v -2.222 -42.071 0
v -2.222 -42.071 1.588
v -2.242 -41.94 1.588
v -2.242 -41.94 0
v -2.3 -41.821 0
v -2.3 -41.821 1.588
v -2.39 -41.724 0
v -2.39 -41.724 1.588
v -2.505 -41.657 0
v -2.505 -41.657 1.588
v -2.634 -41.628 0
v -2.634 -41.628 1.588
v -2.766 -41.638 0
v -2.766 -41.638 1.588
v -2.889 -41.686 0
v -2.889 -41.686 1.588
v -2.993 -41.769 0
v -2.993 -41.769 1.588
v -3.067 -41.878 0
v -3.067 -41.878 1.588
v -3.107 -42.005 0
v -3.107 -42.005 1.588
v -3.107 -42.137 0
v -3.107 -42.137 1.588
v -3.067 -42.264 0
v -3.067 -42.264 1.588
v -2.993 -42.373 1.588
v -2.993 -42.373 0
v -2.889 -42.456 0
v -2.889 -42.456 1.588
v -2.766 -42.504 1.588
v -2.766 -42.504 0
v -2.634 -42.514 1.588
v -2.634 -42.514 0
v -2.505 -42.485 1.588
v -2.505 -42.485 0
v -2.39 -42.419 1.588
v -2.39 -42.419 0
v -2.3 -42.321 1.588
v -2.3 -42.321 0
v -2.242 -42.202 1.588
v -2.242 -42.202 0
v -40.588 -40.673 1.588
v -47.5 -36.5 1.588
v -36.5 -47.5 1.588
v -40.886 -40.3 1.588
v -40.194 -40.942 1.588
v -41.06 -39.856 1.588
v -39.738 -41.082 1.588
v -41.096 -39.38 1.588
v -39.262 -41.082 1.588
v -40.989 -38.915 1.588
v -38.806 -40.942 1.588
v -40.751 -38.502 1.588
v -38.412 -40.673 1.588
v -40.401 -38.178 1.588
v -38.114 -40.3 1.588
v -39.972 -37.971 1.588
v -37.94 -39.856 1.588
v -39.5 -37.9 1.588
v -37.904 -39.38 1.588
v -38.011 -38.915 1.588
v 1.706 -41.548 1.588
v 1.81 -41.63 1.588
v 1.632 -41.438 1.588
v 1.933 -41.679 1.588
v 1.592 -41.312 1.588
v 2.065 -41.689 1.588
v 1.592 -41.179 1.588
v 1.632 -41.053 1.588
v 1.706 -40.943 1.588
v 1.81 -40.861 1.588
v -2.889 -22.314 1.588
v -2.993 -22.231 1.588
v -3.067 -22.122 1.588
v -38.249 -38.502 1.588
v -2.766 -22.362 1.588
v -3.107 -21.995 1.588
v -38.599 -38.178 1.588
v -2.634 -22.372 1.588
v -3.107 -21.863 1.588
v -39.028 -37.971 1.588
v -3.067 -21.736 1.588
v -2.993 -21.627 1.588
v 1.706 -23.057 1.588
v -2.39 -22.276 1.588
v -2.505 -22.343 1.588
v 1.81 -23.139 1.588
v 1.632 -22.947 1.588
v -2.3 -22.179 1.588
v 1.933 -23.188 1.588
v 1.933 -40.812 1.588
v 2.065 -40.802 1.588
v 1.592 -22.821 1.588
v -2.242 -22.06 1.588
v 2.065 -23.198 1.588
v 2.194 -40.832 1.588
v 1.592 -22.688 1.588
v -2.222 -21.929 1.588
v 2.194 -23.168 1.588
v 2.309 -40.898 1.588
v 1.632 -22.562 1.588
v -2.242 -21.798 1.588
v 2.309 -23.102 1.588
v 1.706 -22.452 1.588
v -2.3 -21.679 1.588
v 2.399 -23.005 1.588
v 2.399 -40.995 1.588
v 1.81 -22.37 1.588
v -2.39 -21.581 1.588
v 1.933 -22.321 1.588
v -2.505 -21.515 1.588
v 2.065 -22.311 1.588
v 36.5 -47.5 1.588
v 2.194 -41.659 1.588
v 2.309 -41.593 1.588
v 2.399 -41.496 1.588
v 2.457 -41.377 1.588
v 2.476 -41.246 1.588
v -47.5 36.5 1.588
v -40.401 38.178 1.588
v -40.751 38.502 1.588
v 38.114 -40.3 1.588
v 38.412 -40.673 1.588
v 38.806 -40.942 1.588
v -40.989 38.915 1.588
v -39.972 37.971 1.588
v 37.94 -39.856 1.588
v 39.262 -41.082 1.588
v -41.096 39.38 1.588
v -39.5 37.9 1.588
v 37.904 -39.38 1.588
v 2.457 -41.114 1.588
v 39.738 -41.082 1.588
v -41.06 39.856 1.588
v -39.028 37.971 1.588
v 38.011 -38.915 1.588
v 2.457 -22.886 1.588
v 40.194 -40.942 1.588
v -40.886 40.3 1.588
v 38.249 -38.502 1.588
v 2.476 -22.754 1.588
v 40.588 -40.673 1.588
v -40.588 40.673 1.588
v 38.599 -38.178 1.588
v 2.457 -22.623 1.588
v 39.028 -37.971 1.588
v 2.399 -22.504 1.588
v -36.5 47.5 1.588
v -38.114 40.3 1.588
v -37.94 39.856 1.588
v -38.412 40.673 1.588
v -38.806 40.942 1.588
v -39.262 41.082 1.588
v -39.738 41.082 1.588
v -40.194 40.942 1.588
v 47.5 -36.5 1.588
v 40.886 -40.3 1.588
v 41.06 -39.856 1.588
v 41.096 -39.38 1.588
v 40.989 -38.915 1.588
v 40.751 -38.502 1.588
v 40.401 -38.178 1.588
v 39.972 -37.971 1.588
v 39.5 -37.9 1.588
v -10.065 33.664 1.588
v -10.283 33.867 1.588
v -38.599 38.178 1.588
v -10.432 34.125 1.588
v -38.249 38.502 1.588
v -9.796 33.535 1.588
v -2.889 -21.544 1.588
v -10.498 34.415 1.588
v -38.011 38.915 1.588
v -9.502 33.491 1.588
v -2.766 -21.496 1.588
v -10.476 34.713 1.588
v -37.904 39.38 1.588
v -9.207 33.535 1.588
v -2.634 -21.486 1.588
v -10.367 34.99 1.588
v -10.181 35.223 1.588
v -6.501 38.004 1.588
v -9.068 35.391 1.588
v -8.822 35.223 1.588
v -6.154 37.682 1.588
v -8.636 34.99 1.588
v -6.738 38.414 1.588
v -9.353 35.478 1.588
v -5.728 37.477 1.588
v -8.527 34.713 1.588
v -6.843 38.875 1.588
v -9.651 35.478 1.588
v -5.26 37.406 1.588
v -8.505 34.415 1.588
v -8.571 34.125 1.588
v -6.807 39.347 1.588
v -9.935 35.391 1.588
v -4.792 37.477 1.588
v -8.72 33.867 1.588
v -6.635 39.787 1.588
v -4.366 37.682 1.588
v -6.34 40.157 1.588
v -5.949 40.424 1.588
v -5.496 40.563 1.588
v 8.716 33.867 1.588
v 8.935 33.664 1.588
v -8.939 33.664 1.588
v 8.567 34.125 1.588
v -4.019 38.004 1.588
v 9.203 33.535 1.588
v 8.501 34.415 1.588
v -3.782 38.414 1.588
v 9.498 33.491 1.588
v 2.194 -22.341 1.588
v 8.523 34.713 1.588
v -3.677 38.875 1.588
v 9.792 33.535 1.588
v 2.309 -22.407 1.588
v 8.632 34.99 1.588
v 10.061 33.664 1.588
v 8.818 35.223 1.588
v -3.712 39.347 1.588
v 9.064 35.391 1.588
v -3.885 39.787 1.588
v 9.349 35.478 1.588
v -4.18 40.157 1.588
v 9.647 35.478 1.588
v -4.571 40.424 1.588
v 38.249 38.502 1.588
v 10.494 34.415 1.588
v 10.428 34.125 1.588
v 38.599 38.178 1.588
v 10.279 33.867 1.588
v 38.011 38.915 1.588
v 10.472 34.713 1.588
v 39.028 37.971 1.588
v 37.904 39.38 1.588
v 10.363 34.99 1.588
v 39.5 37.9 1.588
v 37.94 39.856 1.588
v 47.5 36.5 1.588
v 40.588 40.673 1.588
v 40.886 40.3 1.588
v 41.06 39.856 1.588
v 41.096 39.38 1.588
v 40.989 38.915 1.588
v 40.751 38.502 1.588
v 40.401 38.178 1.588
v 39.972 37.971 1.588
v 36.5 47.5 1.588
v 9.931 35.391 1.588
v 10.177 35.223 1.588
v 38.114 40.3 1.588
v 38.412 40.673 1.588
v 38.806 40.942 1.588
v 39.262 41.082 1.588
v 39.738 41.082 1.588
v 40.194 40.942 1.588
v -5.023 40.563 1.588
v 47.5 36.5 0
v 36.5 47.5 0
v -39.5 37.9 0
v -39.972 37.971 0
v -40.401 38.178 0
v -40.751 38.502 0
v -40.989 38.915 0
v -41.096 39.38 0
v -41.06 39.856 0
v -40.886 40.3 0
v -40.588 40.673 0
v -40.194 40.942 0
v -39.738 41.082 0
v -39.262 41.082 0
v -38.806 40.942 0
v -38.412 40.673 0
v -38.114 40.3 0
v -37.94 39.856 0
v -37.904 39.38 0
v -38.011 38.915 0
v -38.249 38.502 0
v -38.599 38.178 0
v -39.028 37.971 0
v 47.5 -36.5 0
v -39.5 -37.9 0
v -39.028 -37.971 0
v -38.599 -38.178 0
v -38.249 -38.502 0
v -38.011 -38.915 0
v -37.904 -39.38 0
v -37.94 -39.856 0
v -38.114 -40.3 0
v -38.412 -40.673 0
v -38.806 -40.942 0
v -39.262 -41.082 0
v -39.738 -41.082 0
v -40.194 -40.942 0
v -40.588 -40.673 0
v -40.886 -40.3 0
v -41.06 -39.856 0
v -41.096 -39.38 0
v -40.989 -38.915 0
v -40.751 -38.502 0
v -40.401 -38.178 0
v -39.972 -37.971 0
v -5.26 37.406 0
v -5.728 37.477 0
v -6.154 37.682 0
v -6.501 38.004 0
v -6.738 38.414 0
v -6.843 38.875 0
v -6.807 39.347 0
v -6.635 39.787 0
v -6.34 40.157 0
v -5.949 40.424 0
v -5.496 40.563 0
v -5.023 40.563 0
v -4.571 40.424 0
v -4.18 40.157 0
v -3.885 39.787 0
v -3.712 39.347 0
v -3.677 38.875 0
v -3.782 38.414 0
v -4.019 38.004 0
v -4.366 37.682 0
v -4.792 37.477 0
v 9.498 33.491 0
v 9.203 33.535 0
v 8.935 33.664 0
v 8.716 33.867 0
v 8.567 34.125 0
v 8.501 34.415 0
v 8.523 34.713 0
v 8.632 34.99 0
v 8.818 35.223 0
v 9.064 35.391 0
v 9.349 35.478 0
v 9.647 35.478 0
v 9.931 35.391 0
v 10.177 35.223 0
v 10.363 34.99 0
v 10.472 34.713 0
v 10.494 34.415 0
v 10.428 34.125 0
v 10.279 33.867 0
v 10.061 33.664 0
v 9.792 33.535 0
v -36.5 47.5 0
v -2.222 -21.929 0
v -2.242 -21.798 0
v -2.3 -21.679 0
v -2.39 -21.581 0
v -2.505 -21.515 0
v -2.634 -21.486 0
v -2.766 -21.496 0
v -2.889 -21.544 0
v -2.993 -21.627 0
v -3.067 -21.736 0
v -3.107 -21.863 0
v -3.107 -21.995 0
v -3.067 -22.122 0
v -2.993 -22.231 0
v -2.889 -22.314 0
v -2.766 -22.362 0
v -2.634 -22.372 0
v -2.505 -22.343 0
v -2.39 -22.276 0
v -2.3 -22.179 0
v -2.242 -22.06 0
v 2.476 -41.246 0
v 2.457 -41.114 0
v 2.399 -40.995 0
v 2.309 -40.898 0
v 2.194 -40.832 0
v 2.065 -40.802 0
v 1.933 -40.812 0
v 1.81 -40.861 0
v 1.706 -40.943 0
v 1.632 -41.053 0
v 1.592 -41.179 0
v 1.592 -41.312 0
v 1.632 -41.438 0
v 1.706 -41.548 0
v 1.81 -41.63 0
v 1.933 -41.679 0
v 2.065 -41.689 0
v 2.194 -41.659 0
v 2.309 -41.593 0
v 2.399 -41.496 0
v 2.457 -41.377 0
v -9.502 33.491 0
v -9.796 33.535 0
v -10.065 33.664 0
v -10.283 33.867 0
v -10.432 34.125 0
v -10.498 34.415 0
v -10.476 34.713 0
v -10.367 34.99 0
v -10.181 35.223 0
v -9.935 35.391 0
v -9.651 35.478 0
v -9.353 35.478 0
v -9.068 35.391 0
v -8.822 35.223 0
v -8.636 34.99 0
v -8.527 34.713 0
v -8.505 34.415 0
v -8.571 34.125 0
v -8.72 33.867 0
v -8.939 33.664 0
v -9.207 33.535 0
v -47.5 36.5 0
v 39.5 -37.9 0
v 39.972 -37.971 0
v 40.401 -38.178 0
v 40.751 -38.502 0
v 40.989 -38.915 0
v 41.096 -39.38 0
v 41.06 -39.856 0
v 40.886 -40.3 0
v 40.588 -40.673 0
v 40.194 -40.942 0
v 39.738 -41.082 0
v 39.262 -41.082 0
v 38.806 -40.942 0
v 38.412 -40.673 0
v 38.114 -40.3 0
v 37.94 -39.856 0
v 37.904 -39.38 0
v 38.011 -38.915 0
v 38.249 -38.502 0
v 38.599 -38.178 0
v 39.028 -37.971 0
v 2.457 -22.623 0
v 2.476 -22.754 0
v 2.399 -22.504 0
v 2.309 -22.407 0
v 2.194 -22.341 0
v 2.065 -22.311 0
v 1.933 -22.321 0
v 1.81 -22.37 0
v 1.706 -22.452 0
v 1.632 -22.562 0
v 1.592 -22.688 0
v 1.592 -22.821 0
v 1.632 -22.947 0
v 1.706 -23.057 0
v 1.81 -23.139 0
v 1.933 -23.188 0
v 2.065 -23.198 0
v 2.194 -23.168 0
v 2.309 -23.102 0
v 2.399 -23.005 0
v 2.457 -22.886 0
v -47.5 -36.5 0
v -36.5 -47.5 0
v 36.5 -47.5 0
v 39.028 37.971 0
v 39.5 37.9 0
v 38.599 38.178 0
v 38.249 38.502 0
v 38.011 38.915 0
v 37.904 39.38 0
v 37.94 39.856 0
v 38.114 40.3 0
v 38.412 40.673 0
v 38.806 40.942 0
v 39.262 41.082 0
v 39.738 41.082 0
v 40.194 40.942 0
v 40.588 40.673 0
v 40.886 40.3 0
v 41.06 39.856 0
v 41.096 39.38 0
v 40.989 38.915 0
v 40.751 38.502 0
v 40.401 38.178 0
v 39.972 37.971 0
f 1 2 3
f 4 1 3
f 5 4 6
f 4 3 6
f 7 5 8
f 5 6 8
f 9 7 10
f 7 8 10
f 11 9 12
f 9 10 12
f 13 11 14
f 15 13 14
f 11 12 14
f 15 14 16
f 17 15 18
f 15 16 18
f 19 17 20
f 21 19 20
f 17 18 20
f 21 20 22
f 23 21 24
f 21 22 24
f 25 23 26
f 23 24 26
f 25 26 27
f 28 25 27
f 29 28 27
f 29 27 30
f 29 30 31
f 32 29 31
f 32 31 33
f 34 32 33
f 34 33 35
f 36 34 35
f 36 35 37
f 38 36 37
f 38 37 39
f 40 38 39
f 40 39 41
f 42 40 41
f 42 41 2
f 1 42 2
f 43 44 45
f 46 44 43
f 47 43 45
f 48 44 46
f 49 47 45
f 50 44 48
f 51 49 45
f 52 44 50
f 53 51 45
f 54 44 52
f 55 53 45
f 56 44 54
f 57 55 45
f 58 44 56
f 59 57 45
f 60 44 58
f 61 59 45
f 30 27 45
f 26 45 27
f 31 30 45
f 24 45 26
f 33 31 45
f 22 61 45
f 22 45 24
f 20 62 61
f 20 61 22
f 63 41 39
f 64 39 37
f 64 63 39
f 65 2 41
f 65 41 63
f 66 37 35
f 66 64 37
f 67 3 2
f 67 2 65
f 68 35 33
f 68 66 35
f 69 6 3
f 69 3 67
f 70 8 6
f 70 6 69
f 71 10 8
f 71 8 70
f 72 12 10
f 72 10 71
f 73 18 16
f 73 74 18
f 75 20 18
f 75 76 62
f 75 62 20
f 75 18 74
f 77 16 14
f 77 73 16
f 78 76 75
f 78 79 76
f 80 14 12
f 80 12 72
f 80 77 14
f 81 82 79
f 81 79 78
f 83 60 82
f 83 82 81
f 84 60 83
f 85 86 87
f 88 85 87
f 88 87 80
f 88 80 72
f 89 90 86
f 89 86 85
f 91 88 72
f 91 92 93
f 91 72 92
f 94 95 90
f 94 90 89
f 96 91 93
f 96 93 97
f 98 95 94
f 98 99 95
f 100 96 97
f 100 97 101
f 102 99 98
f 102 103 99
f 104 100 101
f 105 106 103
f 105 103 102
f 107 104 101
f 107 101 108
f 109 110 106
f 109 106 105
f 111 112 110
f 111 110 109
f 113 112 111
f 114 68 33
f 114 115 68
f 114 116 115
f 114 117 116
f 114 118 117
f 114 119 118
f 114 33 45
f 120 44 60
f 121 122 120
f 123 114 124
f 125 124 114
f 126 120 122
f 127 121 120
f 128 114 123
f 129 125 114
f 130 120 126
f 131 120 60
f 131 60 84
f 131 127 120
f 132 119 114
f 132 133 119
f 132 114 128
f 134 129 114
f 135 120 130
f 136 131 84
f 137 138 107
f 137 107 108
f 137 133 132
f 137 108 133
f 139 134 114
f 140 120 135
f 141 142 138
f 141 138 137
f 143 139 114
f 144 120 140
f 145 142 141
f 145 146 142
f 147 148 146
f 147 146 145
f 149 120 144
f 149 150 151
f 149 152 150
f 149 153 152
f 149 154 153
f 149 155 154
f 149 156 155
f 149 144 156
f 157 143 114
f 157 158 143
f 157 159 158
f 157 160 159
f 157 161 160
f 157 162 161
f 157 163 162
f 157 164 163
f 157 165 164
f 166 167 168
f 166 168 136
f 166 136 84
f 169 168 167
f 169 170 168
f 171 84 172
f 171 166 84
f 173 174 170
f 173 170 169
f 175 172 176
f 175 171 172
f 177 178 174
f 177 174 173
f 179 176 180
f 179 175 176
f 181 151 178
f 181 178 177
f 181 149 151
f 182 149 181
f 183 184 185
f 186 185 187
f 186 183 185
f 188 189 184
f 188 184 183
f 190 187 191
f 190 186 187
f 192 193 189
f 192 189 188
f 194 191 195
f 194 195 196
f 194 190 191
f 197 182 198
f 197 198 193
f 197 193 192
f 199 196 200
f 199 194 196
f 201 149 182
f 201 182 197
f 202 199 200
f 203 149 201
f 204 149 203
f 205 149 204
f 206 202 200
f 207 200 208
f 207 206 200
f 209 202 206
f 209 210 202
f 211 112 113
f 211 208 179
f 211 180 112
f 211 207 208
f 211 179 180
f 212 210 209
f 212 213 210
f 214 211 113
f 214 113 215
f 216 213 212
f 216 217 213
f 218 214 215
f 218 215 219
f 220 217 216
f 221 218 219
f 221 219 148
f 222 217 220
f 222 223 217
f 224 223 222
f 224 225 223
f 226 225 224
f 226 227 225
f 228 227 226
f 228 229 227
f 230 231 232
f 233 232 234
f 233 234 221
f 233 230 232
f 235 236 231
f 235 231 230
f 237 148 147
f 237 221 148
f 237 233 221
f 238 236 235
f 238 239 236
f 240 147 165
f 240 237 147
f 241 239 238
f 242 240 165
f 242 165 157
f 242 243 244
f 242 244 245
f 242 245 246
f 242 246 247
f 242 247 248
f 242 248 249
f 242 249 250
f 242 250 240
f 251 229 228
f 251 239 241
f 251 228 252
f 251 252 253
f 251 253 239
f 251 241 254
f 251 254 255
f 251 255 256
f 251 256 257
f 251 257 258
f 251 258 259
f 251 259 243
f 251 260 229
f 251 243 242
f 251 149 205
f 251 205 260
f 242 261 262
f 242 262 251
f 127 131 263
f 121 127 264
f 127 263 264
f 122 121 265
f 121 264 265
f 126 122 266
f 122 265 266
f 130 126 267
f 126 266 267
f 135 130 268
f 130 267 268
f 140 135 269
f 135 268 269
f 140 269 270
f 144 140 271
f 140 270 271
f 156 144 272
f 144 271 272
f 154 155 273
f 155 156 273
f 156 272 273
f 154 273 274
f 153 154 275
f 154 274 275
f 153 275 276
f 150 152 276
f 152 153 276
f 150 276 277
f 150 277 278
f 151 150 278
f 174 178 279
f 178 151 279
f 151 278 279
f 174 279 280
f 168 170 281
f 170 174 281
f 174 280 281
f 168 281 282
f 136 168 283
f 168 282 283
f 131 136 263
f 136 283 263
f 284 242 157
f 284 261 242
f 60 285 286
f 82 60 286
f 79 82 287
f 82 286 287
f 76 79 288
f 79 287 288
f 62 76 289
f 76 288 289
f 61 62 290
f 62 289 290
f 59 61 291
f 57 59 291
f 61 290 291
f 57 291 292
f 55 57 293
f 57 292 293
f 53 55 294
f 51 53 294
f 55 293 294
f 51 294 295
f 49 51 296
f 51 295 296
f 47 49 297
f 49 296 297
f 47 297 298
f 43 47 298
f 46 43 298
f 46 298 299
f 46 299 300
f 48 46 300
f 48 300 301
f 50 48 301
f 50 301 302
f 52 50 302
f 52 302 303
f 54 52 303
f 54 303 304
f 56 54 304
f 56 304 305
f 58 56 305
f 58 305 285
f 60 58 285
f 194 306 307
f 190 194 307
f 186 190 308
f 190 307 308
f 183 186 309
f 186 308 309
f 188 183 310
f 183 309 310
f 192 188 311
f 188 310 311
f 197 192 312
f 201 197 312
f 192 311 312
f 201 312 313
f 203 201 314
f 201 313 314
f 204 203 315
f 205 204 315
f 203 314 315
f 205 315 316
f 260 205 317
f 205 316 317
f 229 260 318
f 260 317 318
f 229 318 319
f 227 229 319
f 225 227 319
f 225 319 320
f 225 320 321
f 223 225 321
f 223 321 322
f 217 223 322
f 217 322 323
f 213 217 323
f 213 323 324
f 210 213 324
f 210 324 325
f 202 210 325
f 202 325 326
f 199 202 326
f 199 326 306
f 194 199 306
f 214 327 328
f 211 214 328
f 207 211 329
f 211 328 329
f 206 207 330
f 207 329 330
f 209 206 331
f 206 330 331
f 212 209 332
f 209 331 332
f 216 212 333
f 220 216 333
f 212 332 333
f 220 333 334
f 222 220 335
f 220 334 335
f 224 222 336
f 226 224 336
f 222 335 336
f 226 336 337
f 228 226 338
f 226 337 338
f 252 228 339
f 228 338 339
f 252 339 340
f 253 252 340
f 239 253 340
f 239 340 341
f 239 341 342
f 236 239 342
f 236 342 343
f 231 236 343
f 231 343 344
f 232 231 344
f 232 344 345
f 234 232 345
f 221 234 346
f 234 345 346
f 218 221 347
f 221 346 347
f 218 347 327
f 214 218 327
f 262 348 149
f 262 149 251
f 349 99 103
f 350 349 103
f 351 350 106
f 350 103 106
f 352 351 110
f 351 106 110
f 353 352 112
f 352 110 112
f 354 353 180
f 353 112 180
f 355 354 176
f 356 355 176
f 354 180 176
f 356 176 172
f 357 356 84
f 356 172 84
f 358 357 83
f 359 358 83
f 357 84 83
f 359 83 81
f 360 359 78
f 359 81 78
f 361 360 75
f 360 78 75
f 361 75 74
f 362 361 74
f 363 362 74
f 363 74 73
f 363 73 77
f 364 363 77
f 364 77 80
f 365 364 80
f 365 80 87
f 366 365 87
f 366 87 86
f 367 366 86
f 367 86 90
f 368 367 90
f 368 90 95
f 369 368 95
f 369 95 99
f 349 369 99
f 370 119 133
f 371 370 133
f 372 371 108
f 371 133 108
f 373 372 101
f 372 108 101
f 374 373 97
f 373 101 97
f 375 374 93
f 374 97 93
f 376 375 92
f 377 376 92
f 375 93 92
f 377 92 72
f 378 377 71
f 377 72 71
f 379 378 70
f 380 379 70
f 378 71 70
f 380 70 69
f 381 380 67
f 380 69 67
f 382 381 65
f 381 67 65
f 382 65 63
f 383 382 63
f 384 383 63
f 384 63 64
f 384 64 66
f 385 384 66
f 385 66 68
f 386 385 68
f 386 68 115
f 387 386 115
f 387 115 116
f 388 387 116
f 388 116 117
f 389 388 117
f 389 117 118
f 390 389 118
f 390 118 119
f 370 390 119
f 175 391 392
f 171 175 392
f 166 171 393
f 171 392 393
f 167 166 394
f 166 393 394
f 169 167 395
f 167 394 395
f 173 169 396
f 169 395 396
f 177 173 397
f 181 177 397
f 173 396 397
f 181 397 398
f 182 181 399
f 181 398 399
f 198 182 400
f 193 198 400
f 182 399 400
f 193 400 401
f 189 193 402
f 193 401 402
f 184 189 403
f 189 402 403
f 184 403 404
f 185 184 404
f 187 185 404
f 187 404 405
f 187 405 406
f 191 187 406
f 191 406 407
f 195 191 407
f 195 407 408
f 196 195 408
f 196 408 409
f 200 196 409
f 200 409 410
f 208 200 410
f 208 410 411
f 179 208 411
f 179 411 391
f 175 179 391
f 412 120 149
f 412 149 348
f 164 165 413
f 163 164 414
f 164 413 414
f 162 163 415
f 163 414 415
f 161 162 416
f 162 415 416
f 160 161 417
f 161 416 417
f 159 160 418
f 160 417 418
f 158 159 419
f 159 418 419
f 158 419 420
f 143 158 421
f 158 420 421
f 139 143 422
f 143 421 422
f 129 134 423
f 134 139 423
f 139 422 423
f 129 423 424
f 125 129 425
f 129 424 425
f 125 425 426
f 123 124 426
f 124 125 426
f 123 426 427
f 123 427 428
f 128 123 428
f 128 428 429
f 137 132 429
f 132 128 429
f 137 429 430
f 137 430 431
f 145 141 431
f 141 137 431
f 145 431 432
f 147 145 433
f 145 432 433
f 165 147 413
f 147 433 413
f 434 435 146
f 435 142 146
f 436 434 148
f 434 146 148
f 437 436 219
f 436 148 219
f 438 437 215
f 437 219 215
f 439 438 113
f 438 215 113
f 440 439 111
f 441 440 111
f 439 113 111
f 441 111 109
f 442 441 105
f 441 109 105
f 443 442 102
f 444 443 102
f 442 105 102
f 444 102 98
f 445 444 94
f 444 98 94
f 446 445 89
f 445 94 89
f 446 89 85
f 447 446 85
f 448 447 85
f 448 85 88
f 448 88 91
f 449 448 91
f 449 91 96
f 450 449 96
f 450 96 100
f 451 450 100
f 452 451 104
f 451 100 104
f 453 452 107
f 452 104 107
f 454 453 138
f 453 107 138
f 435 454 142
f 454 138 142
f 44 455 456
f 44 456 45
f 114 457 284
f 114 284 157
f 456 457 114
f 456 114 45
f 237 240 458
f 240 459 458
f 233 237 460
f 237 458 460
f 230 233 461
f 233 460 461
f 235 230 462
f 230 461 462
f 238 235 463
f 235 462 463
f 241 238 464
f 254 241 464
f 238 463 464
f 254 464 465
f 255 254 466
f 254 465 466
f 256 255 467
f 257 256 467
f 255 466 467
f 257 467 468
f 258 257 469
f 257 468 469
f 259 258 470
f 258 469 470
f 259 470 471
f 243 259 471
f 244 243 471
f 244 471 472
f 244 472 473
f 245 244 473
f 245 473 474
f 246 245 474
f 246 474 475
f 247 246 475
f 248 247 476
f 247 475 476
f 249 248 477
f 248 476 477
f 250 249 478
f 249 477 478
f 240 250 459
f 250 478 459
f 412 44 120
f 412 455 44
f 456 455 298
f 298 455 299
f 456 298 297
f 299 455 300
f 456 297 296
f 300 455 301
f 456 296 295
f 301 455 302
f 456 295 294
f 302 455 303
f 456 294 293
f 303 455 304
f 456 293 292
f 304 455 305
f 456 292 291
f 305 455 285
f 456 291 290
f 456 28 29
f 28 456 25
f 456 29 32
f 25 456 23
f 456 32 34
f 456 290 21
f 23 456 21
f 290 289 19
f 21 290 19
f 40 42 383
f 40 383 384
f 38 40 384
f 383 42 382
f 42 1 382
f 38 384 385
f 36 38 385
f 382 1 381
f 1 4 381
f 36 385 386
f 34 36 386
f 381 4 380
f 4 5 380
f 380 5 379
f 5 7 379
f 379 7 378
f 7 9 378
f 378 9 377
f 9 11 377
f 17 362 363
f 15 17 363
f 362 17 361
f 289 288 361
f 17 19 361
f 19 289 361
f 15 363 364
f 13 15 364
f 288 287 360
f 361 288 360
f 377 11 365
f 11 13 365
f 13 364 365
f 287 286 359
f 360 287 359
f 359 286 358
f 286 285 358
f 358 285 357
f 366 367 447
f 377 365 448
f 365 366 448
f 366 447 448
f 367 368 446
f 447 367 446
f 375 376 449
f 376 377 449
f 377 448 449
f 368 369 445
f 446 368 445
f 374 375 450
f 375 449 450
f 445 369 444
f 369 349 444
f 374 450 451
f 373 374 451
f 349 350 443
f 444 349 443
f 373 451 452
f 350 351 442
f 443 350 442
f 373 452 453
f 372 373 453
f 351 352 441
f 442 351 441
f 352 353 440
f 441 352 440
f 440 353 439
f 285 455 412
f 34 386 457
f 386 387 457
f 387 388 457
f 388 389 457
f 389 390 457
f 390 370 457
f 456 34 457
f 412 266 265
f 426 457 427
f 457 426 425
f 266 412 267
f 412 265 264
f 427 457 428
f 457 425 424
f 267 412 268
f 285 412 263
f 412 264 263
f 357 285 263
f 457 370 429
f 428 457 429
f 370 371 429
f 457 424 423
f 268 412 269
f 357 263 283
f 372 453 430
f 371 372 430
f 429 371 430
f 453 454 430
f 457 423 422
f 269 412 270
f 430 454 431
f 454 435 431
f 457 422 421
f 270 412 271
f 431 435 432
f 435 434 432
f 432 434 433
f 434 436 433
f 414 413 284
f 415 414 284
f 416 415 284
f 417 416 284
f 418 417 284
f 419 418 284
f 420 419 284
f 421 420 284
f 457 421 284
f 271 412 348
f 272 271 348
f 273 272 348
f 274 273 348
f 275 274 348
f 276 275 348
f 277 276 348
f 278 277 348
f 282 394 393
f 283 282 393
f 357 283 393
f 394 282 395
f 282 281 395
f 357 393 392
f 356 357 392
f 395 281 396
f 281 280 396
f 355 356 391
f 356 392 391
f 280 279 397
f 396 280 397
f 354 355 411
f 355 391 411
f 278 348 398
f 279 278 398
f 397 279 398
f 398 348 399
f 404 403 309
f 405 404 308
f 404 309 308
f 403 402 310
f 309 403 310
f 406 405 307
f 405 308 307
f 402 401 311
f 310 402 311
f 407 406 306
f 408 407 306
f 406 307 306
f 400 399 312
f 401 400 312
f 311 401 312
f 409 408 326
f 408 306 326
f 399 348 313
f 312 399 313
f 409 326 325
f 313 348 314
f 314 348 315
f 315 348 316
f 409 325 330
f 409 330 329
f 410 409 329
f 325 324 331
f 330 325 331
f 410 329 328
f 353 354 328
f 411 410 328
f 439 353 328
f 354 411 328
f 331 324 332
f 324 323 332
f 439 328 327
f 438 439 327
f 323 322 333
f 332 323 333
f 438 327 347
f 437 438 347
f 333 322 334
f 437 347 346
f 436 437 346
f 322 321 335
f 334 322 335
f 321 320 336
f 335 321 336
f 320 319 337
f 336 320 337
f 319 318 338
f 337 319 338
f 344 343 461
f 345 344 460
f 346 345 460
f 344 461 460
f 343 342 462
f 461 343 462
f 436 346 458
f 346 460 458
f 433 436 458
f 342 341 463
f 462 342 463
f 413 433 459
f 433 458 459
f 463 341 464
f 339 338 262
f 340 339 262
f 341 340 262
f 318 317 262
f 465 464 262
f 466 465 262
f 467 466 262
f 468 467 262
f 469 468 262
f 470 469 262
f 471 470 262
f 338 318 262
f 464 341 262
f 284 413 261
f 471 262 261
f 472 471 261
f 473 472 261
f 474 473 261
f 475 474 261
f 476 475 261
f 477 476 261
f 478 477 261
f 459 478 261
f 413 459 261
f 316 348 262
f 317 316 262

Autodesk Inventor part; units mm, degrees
sketch "AL_spacer_contact_Zminus" plane through (0, 0, 0) normal (0, 0, 1) x (1, 0, 0)
  circle A0 centre (39.5, 39.5) radius 3.175
  circle A1 centre (39.5, -39.5) radius 3.175
  circle A2 centre (-39.5, -39.5) radius 3.175
  circle A3 centre (-39.5, 39.5) radius 3.175
  point P0 (0, 0)
  dimension "d145" = 0
  dimension "d228" = 39.5
  dimension "d229" = 39.5
  dimension "d230" = 39.5
  dimension "d231" = 39.5
  dimension "d232" = 39.5
  dimension "d233" = 39.5
  dimension "d234" = 39.5
  dimension "d235" = 39.5
  dimension "d236" = 6.35
sketch "Delrin_stayout_Zminus" plane through (0, 0, 0) normal (0, 0, 1) x (1, 0, 0)
  line L0 (47.5, 39.5) -> (47.5, 31)
  line L1 (47.5, 31) -> (39.5, 31)
  line L2 (39.5, 31) -> (31, 39.5)
  line L3 (31, 39.5) -> (31, 47.5)
  line L4 (31, 47.5) -> (39.5, 47.5)
  line L5 (39.5, 47.5) -> (47.5, 39.5)
  line L6 (-39.5, 47.5) -> (-47.5, 39.5)
  line L7 (-47.5, 39.5) -> (-47.5, 31)
  line L8 (-47.5, 31) -> (-39.5, 31)
  line L9 (-39.5, 31) -> (-31, 39.5)
  line L10 (-31, 39.5) -> (-31, 47.5)
  line L11 (-31, 47.5) -> (-39.5, 47.5)
  line L12 (47.5, -39.5) -> (39.5, -47.5)
  line L13 (39.5, -47.5) -> (31, -47.5)
  line L14 (31, -47.5) -> (31, -39.5)
  line L15 (31, -39.5) -> (39.5, -31)
  line L16 (39.5, -31) -> (47.5, -31)
  line L17 (47.5, -31) -> (47.5, -39.5)
  line L18 (-39.5, -47.5) -> (-47.5, -39.5)
  line L19 (-47.5, -39.5) -> (-47.5, -31)
  line L20 (-47.5, -31) -> (-39.5, -31)
  line L21 (-39.5, -31) -> (-31, -39.5)
  line L22 (-31, -39.5) -> (-31, -47.5)
  line L23 (-31, -47.5) -> (-39.5, -47.5)
  point P0 (0, 0)
  dimension "d243" = 16.5
  dimension "d244" = 8
  dimension "d245" = 8.5
  dimension "d246" = 16.5
  dimension "d247" = 47.5
  dimension "d248" = 47.5
  dimension "d249" = 47.5
  dimension "d250" = 47.5
  dimension "d251" = 47.5
  dimension "d252" = 47.5
  dimension "d253" = 47.5
  dimension "d254" = 47.5
sketch "Nub_stayout_Zminus" plane through (0, 0, 0) normal (0, 0, 1) x (1, 0, 0)
  line L0 (29, 47.5) -> (39.5, 47.5)
  line L1 (39.5, 47.5) -> (47.5, 39.5)
  line L2 (47.5, 39.5) -> (47.5, 29)
  line L3 (47.5, 29) -> (42, 29)
  line L4 (42, 29) -> (42, 40.4125)
  line L5 (40.4125, 42) -> (29, 42)
  line L6 (29, 42) -> (29, 47.5)
  arc A0 (42, 40.4125) -> (40.4125, 42) centre (40.4125, 40.4125) ccw
  line L7 (-29, 47.5) -> (-39.5, 47.5)
  line L8 (-39.5, 47.5) -> (-47.5, 39.5)
  line L9 (-47.5, 39.5) -> (-47.5, 29)
  line L10 (-47.5, 29) -> (-42, 29)
  line L11 (-42, 29) -> (-42, 40.4125)
  line L12 (-40.4125, 42) -> (-29, 42)
  line L13 (-29, 42) -> (-29, 47.5)
  arc A1 (-40.4125, 42) -> (-42, 40.4125) centre (-40.4125, 40.4125) ccw
  line L14 (-47.5, -29) -> (-42, -29)
  line L15 (-42, -29) -> (-42, -40.4125)
  line L16 (-40.4125, -42) -> (-29, -42)
  line L17 (-29, -42) -> (-29, -47.5)
  line L18 (-29, -47.5) -> (-39.5, -47.5)
  line L19 (-39.5, -47.5) -> (-47.5, -39.5)
  line L20 (-47.5, -39.5) -> (-47.5, -29)
  arc A2 (-42, -40.4125) -> (-40.4125, -42) centre (-40.4125, -40.4125) ccw
  line L21 (47.5, -29) -> (42, -29)
  line L22 (42, -29) -> (42, -40.4125)
  line L23 (40.4125, -42) -> (29, -42)
  line L24 (29, -42) -> (29, -47.5)
  line L25 (29, -47.5) -> (39.5, -47.5)
  line L26 (39.5, -47.5) -> (47.5, -39.5)
  line L27 (47.5, -39.5) -> (47.5, -29)
  arc A3 (40.4125, -42) -> (42, -40.4125) centre (40.4125, -40.4125) ccw
  point P0 (0, 0)
  dimension "d255" = 1.5875
  dimension "d256" = 18.5
  dimension "d257" = 8
  dimension "d258" = 5.5
  dimension "d259" = 47.5
  dimension "d260" = 47.5
  dimension "d264" = 1.5875
  dimension "d265" = 47.5
  dimension "d266" = 47.5
  dimension "d267" = 1.5875
  dimension "d268" = 47.5
  dimension "d269" = 47.5
  dimension "d270" = 1.5875
  dimension "d271" = 47.5
  dimension "d272" = 47.5
ref_plane "Zplus_face" through (0, 0, 1.5875) normal (0, 0, 1) x (1, 0, 0)
sketch "AL_spacer_contact_Zplus" plane through (0, 0, 1.5875) normal (0, 0, 1) x (1, 0, 0)
  circle A0 centre (-39.5, 39.5) radius 3.175
  circle A1 centre (-39.5, -39.5) radius 3.175
  circle A2 centre (39.5, -39.5) radius 3.175
  circle A3 centre (39.5, 39.5) radius 3.175
  point P0 (0, 0)
  dimension "d129" = 39.5
  dimension "d130" = 39.5
  dimension "d131" = 39.5
  dimension "d132" = 39.5
  dimension "d133" = 6.35
sketch "Delrin_stayout_Zplus" plane through (0, 0, 1.5875) normal (0, 0, 1) x (1, 0, 0)
  line L0 (47.5, -31) -> (47.5, -39.5)
  line L1 (47.5, -39.5) -> (39.5, -47.5)
  line L2 (39.5, -47.5) -> (31, -47.5)
  line L3 (31, -47.5) -> (31, -39.5)
  line L4 (31, -39.5) -> (39.5, -31)
  line L5 (39.5, -31) -> (47.5, -31)
  line L6 (47.5, 31) -> (47.5, 39.5)
  line L7 (47.5, 39.5) -> (39.5, 47.5)
  line L8 (39.5, 47.5) -> (31, 47.5)
  line L9 (31, 47.5) -> (31, 39.5)
  line L10 (31, 39.5) -> (39.5, 31)
  line L11 (39.5, 31) -> (47.5, 31)
  line L12 (-39.5, 47.5) -> (-47.5, 39.5)
  line L13 (-47.5, 39.5) -> (-47.5, 31)
  line L14 (-47.5, 31) -> (-39.5, 31)
  line L15 (-39.5, 31) -> (-31, 39.5)
  line L16 (-31, 39.5) -> (-31, 47.5)
  line L17 (-31, 47.5) -> (-39.5, 47.5)
  line L18 (-47.5, -39.5) -> (-39.5, -47.5)
  line L19 (-39.5, -47.5) -> (-31, -47.5)
  line L20 (-31, -47.5) -> (-31, -39.5)
  line L21 (-31, -39.5) -> (-39.5, -31)
  line L22 (-39.5, -31) -> (-47.5, -31)
  line L23 (-47.5, -31) -> (-47.5, -39.5)
  point P0 (0, 0)
  dimension "d115" = 16.5
  dimension "d116" = 16.5
  dimension "d117" = 8
  dimension "d118" = 8.5
  dimension "d121" = 47.5
  dimension "d122" = 47.5
  dimension "d123" = 47.5
  dimension "d124" = 47.5
  dimension "d125" = 47.5
  dimension "d126" = 47.5
  dimension "d127" = 47.5
  dimension "d128" = 47.5
sketch "Nub_stayout_Zplus" plane through (0, 0, 1.5875) normal (0, 0, 1) x (1, 0, 0)
  line L0 (47.5, 29) -> (42, 29)
  line L1 (42, 29) -> (42, 40.4125)
  line L2 (40.4125, 42) -> (29, 42)
  line L3 (29, 42) -> (29, 47.5)
  arc A0 (42, 40.4125) -> (40.4125, 42) centre (40.4125, 40.4125) ccw
  line L4 (29, 47.5) -> (39.5, 47.5)
  line L5 (39.5, 47.5) -> (47.5, 39.5)
  line L6 (47.5, 39.5) -> (47.5, 29)
  line L7 (-39.5, 47.5) -> (-29, 47.5)
  line L8 (-29, 47.5) -> (-29, 42)
  line L9 (-29, 42) -> (-40.4125, 42)
  line L10 (-42, 40.4125) -> (-42, 29)
  line L11 (-42, 29) -> (-47.5, 29)
  line L12 (-47.5, 29) -> (-47.5, 39.5)
  line L13 (-47.5, 39.5) -> (-39.5, 47.5)
  arc A1 (-40.4125, 42) -> (-42, 40.4125) centre (-40.4125, 40.4125) ccw
  line L14 (-47.5, -29) -> (-47.5, -39.5)
  line L15 (-47.5, -39.5) -> (-39.5, -47.5)
  line L16 (-39.5, -47.5) -> (-29, -47.5)
  line L17 (-29, -47.5) -> (-29, -42)
  line L18 (-29, -42) -> (-40.4125, -42)
  line L19 (-42, -40.4125) -> (-42, -29)
  line L20 (-42, -29) -> (-47.5, -29)
  arc A2 (-42, -40.4125) -> (-40.4125, -42) centre (-40.4125, -40.4125) ccw
  line L21 (29, -47.5) -> (39.5, -47.5)
  line L22 (39.5, -47.5) -> (47.5, -39.5)
  line L23 (47.5, -39.5) -> (47.5, -29)
  line L24 (47.5, -29) -> (42, -29)
  line L25 (42, -29) -> (42, -40.4125)
  line L26 (40.4125, -42) -> (29, -42)
  line L27 (29, -42) -> (29, -47.5)
  arc A3 (40.4125, -42) -> (42, -40.4125) centre (40.4125, -40.4125) ccw
  point P0 (0, 0)
  dimension "d146" = 1.5875
  dimension "d147" = 5.5
  dimension "d149" = 18.5
  dimension "d150" = 8
  dimension "d151" = 47.5
  dimension "d152" = 47.5
  dimension "d153" = 1.5875
  dimension "d154" = 47.5
  dimension "d155" = 47.5
  dimension "d156" = 1.5875
  dimension "d157" = 47.5
  dimension "d158" = 47.5
  dimension "d159" = 1.5875
  dimension "d160" = 47.5
  dimension "d161" = 47.5
sketch "Sketch1" plane through (0, 0, 0) normal (0, 0, 1) x (1, 0, 0)
  line L0 (-47.5, 47.5) -> (47.5, 47.5)
  line L1 (47.5, 47.5) -> (47.5, -47.5)
  line L2 (47.5, -47.5) -> (-47.5, -47.5)
  line L3 (-47.5, -47.5) -> (-47.5, 47.5)
  point P0 (0, 0)
  dimension "d0" = 95
  dimension "d1" = 95
  dimension "d2" = 47.5
  dimension "d3" = 47.5
extrude "Extrusion1" add sketch "Sketch1" along normal blind 1.5875
chamfer "Chamfer2" distance 11 angle 45 4 edges at (-47.5, -47.5, 0.7937) (47.5, -47.5, 0.7937) (47.5, 47.5, 0.7937) (-47.5, 47.5, 0.7937)
ref_plane "Work Plane_ConnX" through (-32, 0, 0) normal (1, 0, 0) x (0, 1, 0)
ref_plane "Work Plane_ConnY" through (0, 0, 0) normal (0, 1, 0) x (-1, 0, 0)
sketch "Sketch9" plane through (0, 0, 1.5875) normal (0, 0, 1) x (1, 0, 0)
  line L0 (47.5, 47.5) -> (47.5, -47.5) projected
  line L1 (58.5598, -32) -> (-58.5598, -32)
  circle A0 centre (-2.667, -21.9289) radius 0.4445
  circle A1 centre (-2.667, -42.0711) radius 0.4445
  line L2 (0, 26.5598) -> (0, -90.5598) construction
  point P0 (0, 0)
  point P1 (0, -32)
  dimension "d134" = 20.1422
  dimension "d136" = 2.667
  dimension "d138" = 0.889
  dimension "d141" = 180
  dimension "d350" = 32
  dimension "d351" = 0
extrude "Holes_Conn_Zminus" cut sketch "Sketch9" against normal through all
sketch "Sketch22" plane through (0, 0, 1.5875) normal (0, 0, 1) x (1, 0, 0)
  line L0 (47.5, 36.5) -> (47.5, -36.5) projected
  line L1 (0, -1.0026) -> (0, -62.9974) construction
  line L2 (62.8115, -32) -> (-62.8115, -32)
  circle A0 centre (2.032, -22.7545) radius 0.4445
  circle A1 centre (2.032, -41.2455) radius 0.4445
  point P0 (0, 0)
  point P1 (0, -32)
  dimension "d282" = 180
  dimension "d283" = 18.491
  dimension "d284" = 0.889
  dimension "d285" = 2.032
  dimension "d352" = 32
  dimension "d353" = 0
extrude "Holes_Conn_Zplus" cut sketch "Sketch22" against normal through all
hole "Hole5" at (39.5, 39.5, 1.5875) direction (0, 0, -1) diameter 3.2 end through all
mirror "Mirror5" about plane through (0, 0, 0) normal (1, 0, 0) of "Hole5"
mirror "Mirror6" about plane through (0, 0, 0) normal (0, 1, 0) of "Hole5", "Mirror5"
sketch "Sketch25" plane through (0, 0, 1.5875) normal (0, 0, 1) x (1, 0, 0)
  circle A0 centre (-39.5, -39.5) radius 1.6 projected
  circle A1 centre (39.5, -39.5) radius 1.6 projected
  circle A2 centre (-39.5, 39.5) radius 1.6 projected
  circle A3 centre (39.5, 39.5) radius 1.6 projected
  line L0 (36.5, -47.5) -> (-36.5, -47.5) projected
  line L1 (0, 0) -> (0, -59.2198)
  line L2 (8, -47.5) -> (8, -15.5)
  line L3 (8, -15.5) -> (-8, -15.5)
  line L4 (-8, -15.5) -> (-8, -47.5)
  line L5 (-8, -47.5) -> (-62.7516, -61.7336)
  line L6 (-62.7516, -61.7336) -> (-64.2933, 68.2222)
  line L7 (-64.2933, 68.2222) -> (58.3572, 62.5728)
  line L8 (58.3572, 62.5728) -> (56.5848, -69.017)
  line L9 (56.5848, -69.017) -> (8, -47.5)
  dimension "d362" = 16
  dimension "d363" = 32
extrude "Extrusion9" [suppressed]
sketch "Sketch26" plane through (0, 0, 1.5875) normal (0, 0, 1) x (1, 0, 0)
  line L0 (-47.5, -36.5) -> (-47.5, 36.5) projected
  line L1 (36.5, -47.5) -> (-36.5, -47.5) projected
  line L2 (47.5, 36.5) -> (47.5, -36.5) projected
  line L3 (-36.5, 47.5) -> (36.5, 47.5) projected
  line L4 (47.5, 47.5) -> (47.5, -47.5) construction
  line L5 (47.5, -47.5) -> (-47.5, -47.5) construction
  line L6 (-47.5, -47.5) -> (-47.5, 47.5) construction
  line L7 (-47.5, 47.5) -> (47.5, 47.5) construction
  point P0 (0, 0)
decal "Decal1"
sketch "Sketch27" plane through (0, 0, 0) normal (0, 0, -1) x (-1, 0, 0)
  line L0 (36.5, 47.5) -> (-36.5, 47.5) projected
  line L1 (-47.5, 36.5) -> (-47.5, -36.5) projected
  line L2 (-36.5, -47.5) -> (36.5, -47.5) projected
  line L3 (47.5, -36.5) -> (47.5, 36.5) projected
  line L4 (47.5, 47.5) -> (47.5, -47.5) construction
  line L5 (47.5, -47.5) -> (-47.5, -47.5) construction
  line L6 (-47.5, -47.5) -> (-47.5, 47.5) construction
  line L7 (-47.5, 47.5) -> (47.5, 47.5) construction
  point P0 (0, 0)
decal "Decal2"
hole "Hole13" at (-9.5016, 34.4901, 1.5875) direction (0, 0, -1) diameter 1.999 end through all
hole "Hole14" at (9.4976, 34.4901, 1.5875) direction (0, 0, -1) diameter 1.999 end through all
hole "Hole15" at (-5.2598, 38.9935, 1.5875) direction (0, 0, -1) diameter 3.175 end through all
properties part number "PCB_Batt1" material "FR4"
